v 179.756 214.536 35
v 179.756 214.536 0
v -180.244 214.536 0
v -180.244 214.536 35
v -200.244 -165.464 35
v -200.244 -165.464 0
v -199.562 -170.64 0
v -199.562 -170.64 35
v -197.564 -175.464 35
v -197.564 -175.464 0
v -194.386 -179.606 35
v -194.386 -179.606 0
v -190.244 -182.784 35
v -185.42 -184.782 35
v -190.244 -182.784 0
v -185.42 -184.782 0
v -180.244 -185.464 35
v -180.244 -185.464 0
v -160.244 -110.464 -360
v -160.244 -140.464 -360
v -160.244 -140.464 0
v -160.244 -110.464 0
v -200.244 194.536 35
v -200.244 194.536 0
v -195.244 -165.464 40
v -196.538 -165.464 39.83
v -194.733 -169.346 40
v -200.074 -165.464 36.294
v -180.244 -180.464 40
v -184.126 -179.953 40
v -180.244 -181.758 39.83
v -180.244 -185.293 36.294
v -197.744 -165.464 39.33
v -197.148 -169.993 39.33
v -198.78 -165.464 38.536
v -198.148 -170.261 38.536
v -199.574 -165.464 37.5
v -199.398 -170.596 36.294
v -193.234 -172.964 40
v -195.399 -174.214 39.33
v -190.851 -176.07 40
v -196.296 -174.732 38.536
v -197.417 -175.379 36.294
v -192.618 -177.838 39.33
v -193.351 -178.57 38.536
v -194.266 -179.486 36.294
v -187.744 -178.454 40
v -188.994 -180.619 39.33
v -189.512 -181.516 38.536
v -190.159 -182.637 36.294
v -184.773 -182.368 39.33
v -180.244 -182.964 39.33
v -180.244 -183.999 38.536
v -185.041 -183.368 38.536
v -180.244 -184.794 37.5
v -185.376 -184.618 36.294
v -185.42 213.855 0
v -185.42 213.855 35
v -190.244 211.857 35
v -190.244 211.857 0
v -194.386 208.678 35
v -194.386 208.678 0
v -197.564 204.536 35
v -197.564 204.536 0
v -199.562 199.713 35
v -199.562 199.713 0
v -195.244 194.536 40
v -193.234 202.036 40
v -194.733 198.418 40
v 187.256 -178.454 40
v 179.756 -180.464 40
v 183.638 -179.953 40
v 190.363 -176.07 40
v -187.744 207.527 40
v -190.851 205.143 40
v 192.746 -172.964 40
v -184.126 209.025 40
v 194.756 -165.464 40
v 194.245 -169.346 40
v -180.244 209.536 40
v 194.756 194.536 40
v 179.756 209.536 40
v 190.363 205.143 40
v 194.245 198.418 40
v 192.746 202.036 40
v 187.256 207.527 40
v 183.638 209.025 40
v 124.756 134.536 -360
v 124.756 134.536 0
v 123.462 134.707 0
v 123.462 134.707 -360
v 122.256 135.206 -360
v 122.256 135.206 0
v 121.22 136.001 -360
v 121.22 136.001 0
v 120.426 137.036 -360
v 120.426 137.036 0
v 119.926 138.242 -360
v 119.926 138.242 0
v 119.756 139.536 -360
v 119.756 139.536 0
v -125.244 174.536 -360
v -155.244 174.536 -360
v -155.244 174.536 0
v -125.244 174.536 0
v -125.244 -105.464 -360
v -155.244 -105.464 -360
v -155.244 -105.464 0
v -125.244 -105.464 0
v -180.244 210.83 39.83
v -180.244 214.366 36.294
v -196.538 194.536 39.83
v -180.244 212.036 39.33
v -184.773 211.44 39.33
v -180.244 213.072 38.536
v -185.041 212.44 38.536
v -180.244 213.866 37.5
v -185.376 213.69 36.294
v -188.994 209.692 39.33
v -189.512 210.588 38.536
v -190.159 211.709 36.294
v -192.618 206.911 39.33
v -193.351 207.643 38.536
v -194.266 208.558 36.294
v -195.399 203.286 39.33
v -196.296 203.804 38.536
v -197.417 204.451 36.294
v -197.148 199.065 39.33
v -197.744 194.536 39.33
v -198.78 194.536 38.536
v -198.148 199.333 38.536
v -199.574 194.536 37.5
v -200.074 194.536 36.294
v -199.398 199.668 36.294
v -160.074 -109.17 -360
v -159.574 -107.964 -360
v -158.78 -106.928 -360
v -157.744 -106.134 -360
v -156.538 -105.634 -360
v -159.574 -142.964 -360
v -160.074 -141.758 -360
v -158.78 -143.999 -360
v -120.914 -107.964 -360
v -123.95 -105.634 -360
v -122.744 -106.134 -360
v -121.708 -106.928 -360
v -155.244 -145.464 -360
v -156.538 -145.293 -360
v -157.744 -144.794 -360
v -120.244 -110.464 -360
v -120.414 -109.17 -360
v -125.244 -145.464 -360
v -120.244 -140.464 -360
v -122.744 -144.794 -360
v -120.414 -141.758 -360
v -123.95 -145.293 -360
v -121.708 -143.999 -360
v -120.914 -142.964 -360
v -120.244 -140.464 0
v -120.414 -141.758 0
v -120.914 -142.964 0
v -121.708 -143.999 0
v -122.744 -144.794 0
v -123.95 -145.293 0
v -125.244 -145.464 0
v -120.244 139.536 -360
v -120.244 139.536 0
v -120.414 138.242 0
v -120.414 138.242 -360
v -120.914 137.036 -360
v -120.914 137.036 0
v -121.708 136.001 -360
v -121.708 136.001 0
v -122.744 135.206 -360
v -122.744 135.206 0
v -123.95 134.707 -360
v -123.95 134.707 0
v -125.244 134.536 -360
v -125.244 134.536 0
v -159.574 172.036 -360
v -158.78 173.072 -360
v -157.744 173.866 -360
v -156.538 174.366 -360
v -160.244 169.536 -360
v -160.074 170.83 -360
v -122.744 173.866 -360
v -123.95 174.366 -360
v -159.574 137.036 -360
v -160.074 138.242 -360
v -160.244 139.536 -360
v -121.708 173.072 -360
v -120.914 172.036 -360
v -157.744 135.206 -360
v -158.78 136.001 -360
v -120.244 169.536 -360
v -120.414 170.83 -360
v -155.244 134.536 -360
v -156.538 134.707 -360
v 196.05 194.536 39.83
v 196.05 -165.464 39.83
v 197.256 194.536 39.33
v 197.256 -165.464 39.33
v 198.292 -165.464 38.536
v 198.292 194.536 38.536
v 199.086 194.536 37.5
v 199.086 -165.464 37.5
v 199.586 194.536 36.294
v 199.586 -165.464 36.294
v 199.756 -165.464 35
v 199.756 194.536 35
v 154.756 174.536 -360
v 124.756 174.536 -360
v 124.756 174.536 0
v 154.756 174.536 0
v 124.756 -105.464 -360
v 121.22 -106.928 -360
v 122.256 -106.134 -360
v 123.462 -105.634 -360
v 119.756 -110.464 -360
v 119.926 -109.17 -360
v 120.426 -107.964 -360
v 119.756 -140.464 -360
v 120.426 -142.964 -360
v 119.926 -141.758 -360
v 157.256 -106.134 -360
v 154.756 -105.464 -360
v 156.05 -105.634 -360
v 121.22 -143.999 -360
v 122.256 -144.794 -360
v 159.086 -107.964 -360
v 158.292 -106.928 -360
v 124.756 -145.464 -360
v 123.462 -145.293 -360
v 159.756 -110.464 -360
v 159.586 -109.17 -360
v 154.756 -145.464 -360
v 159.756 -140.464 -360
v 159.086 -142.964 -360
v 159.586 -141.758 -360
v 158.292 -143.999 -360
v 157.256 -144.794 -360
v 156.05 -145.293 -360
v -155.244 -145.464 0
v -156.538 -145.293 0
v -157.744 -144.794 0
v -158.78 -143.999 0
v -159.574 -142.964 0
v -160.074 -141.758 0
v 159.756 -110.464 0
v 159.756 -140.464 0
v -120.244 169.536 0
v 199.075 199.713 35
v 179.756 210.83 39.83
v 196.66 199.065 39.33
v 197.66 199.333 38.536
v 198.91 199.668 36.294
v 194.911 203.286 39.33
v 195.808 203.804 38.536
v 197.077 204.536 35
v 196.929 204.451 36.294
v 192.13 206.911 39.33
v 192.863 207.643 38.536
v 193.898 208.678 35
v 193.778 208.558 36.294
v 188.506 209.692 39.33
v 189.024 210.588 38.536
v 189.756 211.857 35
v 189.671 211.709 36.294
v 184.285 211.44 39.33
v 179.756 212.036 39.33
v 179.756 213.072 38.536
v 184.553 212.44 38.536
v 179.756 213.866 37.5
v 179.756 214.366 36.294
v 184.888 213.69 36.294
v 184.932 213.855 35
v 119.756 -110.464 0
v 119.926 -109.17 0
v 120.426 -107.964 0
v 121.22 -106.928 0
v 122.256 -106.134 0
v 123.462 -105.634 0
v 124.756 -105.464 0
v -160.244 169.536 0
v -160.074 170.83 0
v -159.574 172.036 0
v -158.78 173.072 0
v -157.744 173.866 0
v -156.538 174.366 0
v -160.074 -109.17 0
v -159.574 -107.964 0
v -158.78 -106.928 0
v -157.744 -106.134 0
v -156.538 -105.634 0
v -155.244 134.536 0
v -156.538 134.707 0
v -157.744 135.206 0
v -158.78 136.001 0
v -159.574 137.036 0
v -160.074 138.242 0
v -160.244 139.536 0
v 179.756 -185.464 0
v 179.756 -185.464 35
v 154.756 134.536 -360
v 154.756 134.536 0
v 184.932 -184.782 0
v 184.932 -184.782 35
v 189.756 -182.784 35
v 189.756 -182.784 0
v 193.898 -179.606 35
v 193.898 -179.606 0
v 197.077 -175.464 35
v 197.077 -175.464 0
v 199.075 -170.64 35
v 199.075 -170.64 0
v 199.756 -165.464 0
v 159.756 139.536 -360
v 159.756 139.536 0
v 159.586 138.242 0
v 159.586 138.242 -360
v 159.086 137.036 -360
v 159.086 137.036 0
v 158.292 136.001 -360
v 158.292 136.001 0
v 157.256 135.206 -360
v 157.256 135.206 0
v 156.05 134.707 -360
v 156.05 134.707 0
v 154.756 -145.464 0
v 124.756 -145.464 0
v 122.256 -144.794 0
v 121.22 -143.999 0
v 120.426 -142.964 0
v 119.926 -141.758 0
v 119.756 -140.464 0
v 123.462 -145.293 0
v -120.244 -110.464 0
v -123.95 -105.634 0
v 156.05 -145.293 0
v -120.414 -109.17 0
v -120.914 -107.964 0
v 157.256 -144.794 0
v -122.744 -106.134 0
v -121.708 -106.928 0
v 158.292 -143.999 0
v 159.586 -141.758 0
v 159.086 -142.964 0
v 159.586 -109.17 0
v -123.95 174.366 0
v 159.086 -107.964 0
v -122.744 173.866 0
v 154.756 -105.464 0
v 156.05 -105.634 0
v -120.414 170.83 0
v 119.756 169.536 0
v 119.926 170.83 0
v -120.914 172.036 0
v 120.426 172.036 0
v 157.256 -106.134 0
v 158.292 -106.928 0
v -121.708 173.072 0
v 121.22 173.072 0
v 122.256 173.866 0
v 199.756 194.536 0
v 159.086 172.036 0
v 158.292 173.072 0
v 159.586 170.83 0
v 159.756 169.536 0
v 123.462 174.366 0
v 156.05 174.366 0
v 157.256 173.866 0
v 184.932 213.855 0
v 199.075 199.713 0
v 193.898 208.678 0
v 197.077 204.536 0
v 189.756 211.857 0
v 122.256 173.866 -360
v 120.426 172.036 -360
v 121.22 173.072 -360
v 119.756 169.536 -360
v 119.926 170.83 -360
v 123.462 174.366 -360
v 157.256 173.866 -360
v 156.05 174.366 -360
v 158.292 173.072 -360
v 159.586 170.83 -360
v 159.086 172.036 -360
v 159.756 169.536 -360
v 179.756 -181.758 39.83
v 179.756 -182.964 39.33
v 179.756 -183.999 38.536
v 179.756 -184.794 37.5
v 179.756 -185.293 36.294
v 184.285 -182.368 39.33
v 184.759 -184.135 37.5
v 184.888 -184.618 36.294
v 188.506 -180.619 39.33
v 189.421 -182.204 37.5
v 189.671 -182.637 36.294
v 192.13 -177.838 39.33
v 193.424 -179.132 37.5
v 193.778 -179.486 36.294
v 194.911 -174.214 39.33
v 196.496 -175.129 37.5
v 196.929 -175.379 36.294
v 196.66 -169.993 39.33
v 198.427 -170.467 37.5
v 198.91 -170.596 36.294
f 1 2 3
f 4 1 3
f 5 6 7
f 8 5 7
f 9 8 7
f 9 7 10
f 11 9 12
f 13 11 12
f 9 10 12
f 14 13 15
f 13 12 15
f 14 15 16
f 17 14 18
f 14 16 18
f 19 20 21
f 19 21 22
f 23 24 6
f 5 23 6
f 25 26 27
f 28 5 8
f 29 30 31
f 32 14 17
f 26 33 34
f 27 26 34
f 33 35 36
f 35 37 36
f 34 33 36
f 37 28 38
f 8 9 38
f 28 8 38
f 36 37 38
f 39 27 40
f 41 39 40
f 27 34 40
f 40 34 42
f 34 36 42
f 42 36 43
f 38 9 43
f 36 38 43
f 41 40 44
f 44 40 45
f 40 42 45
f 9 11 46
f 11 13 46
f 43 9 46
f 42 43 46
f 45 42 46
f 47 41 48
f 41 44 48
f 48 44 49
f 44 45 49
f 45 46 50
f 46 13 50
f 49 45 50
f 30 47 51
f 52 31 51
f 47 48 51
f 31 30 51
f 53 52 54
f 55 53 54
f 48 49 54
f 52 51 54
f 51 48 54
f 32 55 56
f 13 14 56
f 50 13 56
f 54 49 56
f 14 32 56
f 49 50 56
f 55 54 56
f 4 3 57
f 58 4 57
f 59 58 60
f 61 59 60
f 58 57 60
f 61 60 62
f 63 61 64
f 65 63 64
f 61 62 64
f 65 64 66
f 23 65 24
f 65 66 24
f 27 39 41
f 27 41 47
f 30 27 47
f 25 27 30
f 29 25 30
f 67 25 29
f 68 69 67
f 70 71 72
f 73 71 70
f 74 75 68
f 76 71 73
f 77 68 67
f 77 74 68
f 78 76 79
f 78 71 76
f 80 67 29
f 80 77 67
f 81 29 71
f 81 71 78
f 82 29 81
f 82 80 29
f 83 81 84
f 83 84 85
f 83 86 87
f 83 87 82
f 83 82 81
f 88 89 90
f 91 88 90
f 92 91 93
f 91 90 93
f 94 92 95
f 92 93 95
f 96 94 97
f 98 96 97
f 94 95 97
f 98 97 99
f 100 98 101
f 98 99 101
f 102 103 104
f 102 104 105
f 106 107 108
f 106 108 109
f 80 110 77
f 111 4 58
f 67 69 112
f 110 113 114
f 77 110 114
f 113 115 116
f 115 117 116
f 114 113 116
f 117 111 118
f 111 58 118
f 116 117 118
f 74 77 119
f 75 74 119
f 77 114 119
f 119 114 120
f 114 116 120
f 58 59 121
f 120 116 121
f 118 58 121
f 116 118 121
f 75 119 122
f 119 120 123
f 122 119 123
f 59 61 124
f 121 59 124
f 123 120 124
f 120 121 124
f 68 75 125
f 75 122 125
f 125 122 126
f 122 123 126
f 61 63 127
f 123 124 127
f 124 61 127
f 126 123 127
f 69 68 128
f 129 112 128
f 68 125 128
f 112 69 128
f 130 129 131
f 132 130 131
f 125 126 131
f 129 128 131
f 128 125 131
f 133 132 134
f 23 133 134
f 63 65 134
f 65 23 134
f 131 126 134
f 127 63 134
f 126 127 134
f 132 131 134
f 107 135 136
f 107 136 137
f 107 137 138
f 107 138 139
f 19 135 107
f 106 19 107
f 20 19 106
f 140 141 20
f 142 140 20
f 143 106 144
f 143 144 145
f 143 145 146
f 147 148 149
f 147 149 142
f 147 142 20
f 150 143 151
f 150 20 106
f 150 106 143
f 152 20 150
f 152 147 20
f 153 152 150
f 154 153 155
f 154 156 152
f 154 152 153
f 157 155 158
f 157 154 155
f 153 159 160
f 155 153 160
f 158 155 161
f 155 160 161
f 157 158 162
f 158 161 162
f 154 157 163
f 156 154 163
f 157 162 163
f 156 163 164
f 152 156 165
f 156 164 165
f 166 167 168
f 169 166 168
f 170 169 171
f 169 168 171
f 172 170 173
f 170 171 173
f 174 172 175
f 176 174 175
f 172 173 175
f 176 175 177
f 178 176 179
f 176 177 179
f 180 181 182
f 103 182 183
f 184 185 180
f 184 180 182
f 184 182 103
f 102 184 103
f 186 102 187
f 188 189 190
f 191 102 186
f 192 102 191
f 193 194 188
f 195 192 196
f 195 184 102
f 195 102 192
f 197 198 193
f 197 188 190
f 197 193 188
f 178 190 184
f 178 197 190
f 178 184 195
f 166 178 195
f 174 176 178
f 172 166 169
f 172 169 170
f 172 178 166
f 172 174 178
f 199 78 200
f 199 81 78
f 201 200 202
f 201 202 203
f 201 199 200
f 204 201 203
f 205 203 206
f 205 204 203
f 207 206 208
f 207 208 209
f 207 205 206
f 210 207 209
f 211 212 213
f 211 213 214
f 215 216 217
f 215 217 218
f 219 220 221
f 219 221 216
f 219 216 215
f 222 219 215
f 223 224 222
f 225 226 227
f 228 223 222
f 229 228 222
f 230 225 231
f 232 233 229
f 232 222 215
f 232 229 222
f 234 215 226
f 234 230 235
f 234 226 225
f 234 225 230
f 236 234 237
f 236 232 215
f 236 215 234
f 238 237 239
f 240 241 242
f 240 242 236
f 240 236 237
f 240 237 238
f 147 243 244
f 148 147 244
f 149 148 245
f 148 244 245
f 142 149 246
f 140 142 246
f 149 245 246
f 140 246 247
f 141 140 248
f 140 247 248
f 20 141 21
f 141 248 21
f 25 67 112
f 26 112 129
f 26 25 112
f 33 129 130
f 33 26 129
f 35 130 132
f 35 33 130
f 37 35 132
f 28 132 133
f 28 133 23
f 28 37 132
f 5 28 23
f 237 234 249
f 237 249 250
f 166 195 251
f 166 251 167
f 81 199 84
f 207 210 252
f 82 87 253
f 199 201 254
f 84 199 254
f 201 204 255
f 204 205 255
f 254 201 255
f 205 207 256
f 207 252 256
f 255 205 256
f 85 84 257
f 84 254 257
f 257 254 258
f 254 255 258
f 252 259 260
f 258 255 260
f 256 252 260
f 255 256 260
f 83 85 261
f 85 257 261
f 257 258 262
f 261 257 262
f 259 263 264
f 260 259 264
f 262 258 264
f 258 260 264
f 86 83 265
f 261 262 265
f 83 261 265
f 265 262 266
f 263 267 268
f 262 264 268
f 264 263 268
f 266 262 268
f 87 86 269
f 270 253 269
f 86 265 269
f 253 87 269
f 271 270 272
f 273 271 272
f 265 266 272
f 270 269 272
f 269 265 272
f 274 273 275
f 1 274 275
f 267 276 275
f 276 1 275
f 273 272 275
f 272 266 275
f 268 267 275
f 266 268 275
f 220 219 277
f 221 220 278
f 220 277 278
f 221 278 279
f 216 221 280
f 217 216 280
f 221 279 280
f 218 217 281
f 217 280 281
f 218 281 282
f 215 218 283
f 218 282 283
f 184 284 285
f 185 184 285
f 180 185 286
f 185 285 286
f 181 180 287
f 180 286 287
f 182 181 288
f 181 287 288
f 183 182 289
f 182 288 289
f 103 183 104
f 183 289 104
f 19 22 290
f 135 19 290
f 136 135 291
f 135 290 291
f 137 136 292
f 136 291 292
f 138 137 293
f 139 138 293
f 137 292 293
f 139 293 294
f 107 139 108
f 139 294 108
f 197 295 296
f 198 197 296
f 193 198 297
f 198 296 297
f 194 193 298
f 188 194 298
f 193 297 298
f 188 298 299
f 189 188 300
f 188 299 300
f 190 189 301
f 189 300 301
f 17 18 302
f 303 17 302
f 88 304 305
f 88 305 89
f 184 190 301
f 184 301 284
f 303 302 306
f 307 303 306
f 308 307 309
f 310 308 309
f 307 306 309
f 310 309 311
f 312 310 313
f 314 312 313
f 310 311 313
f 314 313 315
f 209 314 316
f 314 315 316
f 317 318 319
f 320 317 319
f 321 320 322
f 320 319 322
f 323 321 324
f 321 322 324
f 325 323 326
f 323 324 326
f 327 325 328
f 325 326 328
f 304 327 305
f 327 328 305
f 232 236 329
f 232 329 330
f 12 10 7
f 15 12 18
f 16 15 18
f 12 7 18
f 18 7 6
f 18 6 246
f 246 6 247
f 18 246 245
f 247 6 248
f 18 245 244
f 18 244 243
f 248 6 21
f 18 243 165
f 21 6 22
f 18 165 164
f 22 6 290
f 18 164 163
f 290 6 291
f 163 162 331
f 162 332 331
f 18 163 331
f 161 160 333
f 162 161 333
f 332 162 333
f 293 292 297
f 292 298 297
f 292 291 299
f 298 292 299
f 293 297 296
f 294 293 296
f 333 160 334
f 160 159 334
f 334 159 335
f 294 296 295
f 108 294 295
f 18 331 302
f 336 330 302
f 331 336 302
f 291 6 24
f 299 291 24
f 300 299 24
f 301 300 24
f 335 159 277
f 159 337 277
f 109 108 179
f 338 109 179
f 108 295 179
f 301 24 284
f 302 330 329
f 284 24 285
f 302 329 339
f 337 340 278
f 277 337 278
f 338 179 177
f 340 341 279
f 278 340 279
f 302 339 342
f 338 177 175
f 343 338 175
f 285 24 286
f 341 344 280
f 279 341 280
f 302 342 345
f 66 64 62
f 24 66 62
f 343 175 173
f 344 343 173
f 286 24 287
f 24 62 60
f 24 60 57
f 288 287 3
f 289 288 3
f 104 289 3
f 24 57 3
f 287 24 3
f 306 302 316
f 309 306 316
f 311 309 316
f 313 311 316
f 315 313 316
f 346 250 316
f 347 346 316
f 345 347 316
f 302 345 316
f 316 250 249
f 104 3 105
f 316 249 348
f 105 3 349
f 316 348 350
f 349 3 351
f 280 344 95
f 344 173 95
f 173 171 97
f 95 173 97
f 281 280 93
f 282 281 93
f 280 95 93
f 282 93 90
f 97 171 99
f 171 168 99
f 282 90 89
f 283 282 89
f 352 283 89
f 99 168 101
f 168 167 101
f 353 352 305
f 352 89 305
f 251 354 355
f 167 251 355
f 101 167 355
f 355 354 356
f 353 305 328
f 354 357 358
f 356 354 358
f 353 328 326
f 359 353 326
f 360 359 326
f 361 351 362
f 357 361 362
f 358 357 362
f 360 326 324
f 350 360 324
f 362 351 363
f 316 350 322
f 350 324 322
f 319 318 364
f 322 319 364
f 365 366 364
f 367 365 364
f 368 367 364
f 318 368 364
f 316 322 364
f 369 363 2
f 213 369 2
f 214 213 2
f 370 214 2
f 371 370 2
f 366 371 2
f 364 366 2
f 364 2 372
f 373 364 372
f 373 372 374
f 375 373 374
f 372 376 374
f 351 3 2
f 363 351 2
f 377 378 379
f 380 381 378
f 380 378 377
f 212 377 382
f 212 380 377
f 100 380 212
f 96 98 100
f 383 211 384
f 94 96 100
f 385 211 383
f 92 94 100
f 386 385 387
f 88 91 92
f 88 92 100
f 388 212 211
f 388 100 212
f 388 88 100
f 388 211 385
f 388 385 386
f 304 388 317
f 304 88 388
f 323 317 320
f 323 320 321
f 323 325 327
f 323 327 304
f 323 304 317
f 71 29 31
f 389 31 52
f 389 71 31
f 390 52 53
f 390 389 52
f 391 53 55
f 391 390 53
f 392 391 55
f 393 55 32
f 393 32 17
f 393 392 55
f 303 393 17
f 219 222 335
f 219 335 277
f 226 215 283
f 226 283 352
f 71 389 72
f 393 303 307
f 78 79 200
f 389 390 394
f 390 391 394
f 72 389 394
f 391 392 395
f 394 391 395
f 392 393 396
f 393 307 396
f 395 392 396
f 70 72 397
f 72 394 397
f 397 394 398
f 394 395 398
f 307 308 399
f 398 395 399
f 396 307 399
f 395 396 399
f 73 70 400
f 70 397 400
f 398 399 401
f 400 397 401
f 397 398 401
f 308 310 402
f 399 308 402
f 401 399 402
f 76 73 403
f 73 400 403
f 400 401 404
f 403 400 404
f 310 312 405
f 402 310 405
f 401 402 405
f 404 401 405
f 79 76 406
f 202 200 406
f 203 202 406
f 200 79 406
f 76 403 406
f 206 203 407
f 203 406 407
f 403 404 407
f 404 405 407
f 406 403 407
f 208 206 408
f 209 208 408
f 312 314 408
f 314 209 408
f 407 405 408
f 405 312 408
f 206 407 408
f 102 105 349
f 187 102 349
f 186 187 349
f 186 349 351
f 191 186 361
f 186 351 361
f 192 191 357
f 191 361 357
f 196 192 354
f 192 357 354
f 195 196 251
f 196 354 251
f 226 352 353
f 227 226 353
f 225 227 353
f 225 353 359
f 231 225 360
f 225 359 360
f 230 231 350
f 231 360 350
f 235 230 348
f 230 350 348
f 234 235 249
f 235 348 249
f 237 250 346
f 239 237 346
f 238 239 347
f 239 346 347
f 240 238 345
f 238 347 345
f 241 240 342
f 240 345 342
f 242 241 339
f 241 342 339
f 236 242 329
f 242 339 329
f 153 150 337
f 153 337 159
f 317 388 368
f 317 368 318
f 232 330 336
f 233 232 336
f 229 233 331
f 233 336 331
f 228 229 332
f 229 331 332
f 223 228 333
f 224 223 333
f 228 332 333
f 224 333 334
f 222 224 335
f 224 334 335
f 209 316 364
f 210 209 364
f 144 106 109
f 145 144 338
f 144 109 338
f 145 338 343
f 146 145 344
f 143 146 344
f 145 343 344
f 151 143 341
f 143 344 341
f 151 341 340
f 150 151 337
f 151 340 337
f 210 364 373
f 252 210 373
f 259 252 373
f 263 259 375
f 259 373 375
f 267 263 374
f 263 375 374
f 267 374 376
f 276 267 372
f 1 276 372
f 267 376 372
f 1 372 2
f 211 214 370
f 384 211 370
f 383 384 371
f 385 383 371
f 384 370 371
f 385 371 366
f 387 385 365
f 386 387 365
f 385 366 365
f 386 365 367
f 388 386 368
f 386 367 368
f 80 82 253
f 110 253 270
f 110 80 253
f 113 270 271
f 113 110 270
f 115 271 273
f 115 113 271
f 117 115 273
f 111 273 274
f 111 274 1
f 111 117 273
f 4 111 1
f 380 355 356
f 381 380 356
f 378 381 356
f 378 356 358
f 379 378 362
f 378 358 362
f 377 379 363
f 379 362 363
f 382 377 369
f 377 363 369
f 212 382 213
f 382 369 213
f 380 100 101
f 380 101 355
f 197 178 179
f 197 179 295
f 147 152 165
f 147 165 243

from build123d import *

# Parameters (mm, degrees)
F1_DEPTH = 40
F3_DEPTH = 360
F4_R     = 5


with BuildPart() as f1:
    # F0 (on Top) → F1 (new body)
    with BuildSketch(Plane.XY):
        with BuildLine():
            Line((179.756029, 214.536132), (-180.243971, 214.536132))
            ThreePointArc((-180.243971, 214.536132), (-194.386107, 208.678267), (-200.243971, 194.536132))
            Line((-200.243971, 194.536132), (-200.243971, -165.463868))
            ThreePointArc((-200.243971, -165.463868), (-194.386107, -179.606004), (-180.243971, -185.463868))
            Line((-180.243971, -185.463868), (179.756029, -185.463868))
            ThreePointArc((179.756029, -185.463868), (193.898164, -179.606004), (199.756029, -165.463868))
            Line((199.756029, -165.463868), (199.756029, 194.536132))
            ThreePointArc((199.756029, 194.536132), (193.898164, 208.678267), (179.756029, 214.536132))
        make_face()
    extrude(amount=F1_DEPTH)

    # F2 (on face) → F3 (join)
    with BuildSketch(Plane(origin=(0, 0, 0), x_dir=(1, 0, 0), z_dir=(0, 0, -1))):
        with BuildLine():
            Line((-125.243971, 145.463868), (-155.243971, 145.463868))
            ThreePointArc((-155.243971, 145.463868), (-158.779505, 143.999402), (-160.243971, 140.463868))
            Line((-160.243971, 140.463868), (-160.243971, 110.463868))
            ThreePointArc((-160.243971, 110.463868), (-158.779505, 106.928334), (-155.243971, 105.463868))
            Line((-155.243971, 105.463868), (-125.243971, 105.463868))
            ThreePointArc((-125.243971, 105.463868), (-121.708437, 106.928334), (-120.243971, 110.463868))
            Line((-120.243971, 110.463868), (-120.243971, 140.463868))
            ThreePointArc((-120.243971, 140.463868), (-121.708437, 143.999402), (-125.243971, 145.463868))
        make_face()
        with BuildLine():
            Line((-125.243971, -134.536132), (-155.243971, -134.536132))
            ThreePointArc((-155.243971, -134.536132), (-158.779505, -136.000598), (-160.243971, -139.536132))
            Line((-160.243971, -139.536132), (-160.243971, -169.536132))
            ThreePointArc((-160.243971, -169.536132), (-158.779505, -173.071666), (-155.243971, -174.536132))
            Line((-155.243971, -174.536132), (-125.243971, -174.536132))
            ThreePointArc((-125.243971, -174.536132), (-121.708437, -173.071666), (-120.243971, -169.536132))
            Line((-120.243971, -169.536132), (-120.243971, -139.536132))
            ThreePointArc((-120.243971, -139.536132), (-121.708437, -136.000598), (-125.243971, -134.536132))
        make_face()
        with BuildLine():
            Line((154.756029, -134.536132), (124.756029, -134.536132))
            ThreePointArc((124.756029, -134.536132), (121.220495, -136.000598), (119.756029, -139.536132))
            Line((119.756029, -139.536132), (119.756029, -169.536132))
            ThreePointArc((119.756029, -169.536132), (121.220495, -173.071666), (124.756029, -174.536132))
            Line((124.756029, -174.536132), (154.756029, -174.536132))
            ThreePointArc((154.756029, -174.536132), (158.291563, -173.071666), (159.756029, -169.536132))
            Line((159.756029, -169.536132), (159.756029, -139.536132))
            ThreePointArc((159.756029, -139.536132), (158.291563, -136.000598), (154.756029, -134.536132))
        make_face()
        with BuildLine():
            Line((154.756029, 145.463868), (124.756029, 145.463868))
            ThreePointArc((124.756029, 145.463868), (121.220495, 143.999402), (119.756029, 140.463868))
            Line((119.756029, 140.463868), (119.756029, 110.463868))
            ThreePointArc((119.756029, 110.463868), (121.220495, 106.928334), (124.756029, 105.463868))
            Line((124.756029, 105.463868), (154.756029, 105.463868))
            ThreePointArc((154.756029, 105.463868), (158.291563, 106.928334), (159.756029, 110.463868))
            Line((159.756029, 110.463868), (159.756029, 140.463868))
            ThreePointArc((159.756029, 140.463868), (158.291563, 143.999402), (154.756029, 145.463868))
        make_face()
    extrude(amount=F3_DEPTH)

    # F4
    f4_edges = [f1.edges().sort_by_distance(p)[0] for p in [
        (199.756029, 14.536132, 40),
        (193.898164, 208.678267, 40),
        (-0.243971, 214.536132, 40),
        (-194.386107, 208.678267, 40),
        (-200.243971, 14.536132, 40),
        (-194.386107, -179.606004, 40),
        (-0.243971, -185.463868, 40),
        (193.898164, -179.606004, 40),
    ]]
    fillet(f4_edges, radius=F4_R)


solid = f1.part
